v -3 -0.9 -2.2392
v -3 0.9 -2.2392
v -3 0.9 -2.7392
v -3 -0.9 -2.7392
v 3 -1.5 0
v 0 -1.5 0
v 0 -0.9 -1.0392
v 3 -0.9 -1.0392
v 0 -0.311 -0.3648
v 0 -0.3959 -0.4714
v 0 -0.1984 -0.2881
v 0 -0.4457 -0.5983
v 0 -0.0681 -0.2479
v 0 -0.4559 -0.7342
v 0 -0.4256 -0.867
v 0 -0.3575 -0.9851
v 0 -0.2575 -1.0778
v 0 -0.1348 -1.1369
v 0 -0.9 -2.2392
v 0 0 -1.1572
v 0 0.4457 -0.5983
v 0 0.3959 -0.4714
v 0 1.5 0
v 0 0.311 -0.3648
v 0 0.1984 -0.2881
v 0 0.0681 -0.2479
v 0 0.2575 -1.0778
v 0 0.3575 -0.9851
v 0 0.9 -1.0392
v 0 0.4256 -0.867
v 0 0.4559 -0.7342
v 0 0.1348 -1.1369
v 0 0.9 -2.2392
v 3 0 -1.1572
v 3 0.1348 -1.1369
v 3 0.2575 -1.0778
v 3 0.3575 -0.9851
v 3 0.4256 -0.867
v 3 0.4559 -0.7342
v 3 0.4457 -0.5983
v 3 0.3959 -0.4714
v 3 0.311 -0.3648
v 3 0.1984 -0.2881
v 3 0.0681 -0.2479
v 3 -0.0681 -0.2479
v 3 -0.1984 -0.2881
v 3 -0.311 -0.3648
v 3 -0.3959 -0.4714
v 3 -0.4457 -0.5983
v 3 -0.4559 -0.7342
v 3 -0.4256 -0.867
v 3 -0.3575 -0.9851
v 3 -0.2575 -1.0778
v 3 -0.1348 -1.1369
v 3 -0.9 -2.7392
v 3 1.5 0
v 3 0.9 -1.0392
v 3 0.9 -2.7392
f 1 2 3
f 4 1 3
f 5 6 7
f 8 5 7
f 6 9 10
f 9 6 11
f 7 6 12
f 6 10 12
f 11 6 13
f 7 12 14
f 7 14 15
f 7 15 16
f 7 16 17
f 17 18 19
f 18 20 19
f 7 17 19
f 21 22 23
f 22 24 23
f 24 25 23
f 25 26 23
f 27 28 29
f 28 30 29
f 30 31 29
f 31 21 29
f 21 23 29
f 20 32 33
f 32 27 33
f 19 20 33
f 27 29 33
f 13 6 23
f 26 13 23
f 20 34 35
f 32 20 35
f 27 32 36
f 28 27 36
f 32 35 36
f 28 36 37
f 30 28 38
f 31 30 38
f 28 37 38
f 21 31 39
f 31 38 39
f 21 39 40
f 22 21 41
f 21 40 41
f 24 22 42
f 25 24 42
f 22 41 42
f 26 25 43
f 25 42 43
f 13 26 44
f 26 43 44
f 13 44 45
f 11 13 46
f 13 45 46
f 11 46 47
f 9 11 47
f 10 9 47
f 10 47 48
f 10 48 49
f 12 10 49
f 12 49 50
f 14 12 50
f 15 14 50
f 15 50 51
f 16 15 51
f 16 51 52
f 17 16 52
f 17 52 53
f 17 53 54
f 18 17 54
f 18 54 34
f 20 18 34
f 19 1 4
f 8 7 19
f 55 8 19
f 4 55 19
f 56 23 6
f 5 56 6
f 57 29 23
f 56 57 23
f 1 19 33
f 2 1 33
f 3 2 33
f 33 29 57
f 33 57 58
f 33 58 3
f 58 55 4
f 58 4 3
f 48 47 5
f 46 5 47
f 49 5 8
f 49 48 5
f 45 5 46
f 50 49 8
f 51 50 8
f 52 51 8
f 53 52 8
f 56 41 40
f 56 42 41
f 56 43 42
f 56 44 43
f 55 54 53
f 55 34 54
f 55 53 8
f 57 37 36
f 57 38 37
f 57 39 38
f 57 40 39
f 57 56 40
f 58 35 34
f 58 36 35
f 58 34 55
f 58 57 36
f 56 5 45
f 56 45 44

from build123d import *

# Parameters (mm, degrees)
BOSS_EXTRUDE1_DEPTH    = 3
F_00_90_TAPPED_HOLE1_D = 0.9144
SKETCH1_5_W            = 0.5
SKETCH1_5_H            = 1.8
BOSS_EXTRUDE2_DEPTH    = 3


with BuildPart() as part:
    # Sketch1 → Boss-Extrude1 (new body)
    with BuildSketch(Plane(origin=(0, 0, 0), x_dir=(0, 0, -1), z_dir=(1, 0, 0))):
        Polygon((0, 1.5), (0, -1.5), (1.039230485, -0.9), (2.739230485, -0.9), (2.739230485, 0.9), (1.039230485, 0.9), align=None)
    extrude(amount=BOSS_EXTRUDE1_DEPTH)

    # #00-90 Tapped Hole1 (through all)
    with Locations(Plane.ZY):
        with Locations((-0.7, 0)):
            Hole(F_00_90_TAPPED_HOLE1_D / 2)

    # Sketch1<5> → Boss-Extrude2 (add)
    with BuildSketch(Plane(origin=(0, 0, 0), x_dir=(0, 0, -1), z_dir=(1, 0, 0))):
        with Locations((2.489230485, 0)):
            Rectangle(SKETCH1_5_W, SKETCH1_5_H)
    extrude(amount=-BOSS_EXTRUDE2_DEPTH)


solid = part.part
